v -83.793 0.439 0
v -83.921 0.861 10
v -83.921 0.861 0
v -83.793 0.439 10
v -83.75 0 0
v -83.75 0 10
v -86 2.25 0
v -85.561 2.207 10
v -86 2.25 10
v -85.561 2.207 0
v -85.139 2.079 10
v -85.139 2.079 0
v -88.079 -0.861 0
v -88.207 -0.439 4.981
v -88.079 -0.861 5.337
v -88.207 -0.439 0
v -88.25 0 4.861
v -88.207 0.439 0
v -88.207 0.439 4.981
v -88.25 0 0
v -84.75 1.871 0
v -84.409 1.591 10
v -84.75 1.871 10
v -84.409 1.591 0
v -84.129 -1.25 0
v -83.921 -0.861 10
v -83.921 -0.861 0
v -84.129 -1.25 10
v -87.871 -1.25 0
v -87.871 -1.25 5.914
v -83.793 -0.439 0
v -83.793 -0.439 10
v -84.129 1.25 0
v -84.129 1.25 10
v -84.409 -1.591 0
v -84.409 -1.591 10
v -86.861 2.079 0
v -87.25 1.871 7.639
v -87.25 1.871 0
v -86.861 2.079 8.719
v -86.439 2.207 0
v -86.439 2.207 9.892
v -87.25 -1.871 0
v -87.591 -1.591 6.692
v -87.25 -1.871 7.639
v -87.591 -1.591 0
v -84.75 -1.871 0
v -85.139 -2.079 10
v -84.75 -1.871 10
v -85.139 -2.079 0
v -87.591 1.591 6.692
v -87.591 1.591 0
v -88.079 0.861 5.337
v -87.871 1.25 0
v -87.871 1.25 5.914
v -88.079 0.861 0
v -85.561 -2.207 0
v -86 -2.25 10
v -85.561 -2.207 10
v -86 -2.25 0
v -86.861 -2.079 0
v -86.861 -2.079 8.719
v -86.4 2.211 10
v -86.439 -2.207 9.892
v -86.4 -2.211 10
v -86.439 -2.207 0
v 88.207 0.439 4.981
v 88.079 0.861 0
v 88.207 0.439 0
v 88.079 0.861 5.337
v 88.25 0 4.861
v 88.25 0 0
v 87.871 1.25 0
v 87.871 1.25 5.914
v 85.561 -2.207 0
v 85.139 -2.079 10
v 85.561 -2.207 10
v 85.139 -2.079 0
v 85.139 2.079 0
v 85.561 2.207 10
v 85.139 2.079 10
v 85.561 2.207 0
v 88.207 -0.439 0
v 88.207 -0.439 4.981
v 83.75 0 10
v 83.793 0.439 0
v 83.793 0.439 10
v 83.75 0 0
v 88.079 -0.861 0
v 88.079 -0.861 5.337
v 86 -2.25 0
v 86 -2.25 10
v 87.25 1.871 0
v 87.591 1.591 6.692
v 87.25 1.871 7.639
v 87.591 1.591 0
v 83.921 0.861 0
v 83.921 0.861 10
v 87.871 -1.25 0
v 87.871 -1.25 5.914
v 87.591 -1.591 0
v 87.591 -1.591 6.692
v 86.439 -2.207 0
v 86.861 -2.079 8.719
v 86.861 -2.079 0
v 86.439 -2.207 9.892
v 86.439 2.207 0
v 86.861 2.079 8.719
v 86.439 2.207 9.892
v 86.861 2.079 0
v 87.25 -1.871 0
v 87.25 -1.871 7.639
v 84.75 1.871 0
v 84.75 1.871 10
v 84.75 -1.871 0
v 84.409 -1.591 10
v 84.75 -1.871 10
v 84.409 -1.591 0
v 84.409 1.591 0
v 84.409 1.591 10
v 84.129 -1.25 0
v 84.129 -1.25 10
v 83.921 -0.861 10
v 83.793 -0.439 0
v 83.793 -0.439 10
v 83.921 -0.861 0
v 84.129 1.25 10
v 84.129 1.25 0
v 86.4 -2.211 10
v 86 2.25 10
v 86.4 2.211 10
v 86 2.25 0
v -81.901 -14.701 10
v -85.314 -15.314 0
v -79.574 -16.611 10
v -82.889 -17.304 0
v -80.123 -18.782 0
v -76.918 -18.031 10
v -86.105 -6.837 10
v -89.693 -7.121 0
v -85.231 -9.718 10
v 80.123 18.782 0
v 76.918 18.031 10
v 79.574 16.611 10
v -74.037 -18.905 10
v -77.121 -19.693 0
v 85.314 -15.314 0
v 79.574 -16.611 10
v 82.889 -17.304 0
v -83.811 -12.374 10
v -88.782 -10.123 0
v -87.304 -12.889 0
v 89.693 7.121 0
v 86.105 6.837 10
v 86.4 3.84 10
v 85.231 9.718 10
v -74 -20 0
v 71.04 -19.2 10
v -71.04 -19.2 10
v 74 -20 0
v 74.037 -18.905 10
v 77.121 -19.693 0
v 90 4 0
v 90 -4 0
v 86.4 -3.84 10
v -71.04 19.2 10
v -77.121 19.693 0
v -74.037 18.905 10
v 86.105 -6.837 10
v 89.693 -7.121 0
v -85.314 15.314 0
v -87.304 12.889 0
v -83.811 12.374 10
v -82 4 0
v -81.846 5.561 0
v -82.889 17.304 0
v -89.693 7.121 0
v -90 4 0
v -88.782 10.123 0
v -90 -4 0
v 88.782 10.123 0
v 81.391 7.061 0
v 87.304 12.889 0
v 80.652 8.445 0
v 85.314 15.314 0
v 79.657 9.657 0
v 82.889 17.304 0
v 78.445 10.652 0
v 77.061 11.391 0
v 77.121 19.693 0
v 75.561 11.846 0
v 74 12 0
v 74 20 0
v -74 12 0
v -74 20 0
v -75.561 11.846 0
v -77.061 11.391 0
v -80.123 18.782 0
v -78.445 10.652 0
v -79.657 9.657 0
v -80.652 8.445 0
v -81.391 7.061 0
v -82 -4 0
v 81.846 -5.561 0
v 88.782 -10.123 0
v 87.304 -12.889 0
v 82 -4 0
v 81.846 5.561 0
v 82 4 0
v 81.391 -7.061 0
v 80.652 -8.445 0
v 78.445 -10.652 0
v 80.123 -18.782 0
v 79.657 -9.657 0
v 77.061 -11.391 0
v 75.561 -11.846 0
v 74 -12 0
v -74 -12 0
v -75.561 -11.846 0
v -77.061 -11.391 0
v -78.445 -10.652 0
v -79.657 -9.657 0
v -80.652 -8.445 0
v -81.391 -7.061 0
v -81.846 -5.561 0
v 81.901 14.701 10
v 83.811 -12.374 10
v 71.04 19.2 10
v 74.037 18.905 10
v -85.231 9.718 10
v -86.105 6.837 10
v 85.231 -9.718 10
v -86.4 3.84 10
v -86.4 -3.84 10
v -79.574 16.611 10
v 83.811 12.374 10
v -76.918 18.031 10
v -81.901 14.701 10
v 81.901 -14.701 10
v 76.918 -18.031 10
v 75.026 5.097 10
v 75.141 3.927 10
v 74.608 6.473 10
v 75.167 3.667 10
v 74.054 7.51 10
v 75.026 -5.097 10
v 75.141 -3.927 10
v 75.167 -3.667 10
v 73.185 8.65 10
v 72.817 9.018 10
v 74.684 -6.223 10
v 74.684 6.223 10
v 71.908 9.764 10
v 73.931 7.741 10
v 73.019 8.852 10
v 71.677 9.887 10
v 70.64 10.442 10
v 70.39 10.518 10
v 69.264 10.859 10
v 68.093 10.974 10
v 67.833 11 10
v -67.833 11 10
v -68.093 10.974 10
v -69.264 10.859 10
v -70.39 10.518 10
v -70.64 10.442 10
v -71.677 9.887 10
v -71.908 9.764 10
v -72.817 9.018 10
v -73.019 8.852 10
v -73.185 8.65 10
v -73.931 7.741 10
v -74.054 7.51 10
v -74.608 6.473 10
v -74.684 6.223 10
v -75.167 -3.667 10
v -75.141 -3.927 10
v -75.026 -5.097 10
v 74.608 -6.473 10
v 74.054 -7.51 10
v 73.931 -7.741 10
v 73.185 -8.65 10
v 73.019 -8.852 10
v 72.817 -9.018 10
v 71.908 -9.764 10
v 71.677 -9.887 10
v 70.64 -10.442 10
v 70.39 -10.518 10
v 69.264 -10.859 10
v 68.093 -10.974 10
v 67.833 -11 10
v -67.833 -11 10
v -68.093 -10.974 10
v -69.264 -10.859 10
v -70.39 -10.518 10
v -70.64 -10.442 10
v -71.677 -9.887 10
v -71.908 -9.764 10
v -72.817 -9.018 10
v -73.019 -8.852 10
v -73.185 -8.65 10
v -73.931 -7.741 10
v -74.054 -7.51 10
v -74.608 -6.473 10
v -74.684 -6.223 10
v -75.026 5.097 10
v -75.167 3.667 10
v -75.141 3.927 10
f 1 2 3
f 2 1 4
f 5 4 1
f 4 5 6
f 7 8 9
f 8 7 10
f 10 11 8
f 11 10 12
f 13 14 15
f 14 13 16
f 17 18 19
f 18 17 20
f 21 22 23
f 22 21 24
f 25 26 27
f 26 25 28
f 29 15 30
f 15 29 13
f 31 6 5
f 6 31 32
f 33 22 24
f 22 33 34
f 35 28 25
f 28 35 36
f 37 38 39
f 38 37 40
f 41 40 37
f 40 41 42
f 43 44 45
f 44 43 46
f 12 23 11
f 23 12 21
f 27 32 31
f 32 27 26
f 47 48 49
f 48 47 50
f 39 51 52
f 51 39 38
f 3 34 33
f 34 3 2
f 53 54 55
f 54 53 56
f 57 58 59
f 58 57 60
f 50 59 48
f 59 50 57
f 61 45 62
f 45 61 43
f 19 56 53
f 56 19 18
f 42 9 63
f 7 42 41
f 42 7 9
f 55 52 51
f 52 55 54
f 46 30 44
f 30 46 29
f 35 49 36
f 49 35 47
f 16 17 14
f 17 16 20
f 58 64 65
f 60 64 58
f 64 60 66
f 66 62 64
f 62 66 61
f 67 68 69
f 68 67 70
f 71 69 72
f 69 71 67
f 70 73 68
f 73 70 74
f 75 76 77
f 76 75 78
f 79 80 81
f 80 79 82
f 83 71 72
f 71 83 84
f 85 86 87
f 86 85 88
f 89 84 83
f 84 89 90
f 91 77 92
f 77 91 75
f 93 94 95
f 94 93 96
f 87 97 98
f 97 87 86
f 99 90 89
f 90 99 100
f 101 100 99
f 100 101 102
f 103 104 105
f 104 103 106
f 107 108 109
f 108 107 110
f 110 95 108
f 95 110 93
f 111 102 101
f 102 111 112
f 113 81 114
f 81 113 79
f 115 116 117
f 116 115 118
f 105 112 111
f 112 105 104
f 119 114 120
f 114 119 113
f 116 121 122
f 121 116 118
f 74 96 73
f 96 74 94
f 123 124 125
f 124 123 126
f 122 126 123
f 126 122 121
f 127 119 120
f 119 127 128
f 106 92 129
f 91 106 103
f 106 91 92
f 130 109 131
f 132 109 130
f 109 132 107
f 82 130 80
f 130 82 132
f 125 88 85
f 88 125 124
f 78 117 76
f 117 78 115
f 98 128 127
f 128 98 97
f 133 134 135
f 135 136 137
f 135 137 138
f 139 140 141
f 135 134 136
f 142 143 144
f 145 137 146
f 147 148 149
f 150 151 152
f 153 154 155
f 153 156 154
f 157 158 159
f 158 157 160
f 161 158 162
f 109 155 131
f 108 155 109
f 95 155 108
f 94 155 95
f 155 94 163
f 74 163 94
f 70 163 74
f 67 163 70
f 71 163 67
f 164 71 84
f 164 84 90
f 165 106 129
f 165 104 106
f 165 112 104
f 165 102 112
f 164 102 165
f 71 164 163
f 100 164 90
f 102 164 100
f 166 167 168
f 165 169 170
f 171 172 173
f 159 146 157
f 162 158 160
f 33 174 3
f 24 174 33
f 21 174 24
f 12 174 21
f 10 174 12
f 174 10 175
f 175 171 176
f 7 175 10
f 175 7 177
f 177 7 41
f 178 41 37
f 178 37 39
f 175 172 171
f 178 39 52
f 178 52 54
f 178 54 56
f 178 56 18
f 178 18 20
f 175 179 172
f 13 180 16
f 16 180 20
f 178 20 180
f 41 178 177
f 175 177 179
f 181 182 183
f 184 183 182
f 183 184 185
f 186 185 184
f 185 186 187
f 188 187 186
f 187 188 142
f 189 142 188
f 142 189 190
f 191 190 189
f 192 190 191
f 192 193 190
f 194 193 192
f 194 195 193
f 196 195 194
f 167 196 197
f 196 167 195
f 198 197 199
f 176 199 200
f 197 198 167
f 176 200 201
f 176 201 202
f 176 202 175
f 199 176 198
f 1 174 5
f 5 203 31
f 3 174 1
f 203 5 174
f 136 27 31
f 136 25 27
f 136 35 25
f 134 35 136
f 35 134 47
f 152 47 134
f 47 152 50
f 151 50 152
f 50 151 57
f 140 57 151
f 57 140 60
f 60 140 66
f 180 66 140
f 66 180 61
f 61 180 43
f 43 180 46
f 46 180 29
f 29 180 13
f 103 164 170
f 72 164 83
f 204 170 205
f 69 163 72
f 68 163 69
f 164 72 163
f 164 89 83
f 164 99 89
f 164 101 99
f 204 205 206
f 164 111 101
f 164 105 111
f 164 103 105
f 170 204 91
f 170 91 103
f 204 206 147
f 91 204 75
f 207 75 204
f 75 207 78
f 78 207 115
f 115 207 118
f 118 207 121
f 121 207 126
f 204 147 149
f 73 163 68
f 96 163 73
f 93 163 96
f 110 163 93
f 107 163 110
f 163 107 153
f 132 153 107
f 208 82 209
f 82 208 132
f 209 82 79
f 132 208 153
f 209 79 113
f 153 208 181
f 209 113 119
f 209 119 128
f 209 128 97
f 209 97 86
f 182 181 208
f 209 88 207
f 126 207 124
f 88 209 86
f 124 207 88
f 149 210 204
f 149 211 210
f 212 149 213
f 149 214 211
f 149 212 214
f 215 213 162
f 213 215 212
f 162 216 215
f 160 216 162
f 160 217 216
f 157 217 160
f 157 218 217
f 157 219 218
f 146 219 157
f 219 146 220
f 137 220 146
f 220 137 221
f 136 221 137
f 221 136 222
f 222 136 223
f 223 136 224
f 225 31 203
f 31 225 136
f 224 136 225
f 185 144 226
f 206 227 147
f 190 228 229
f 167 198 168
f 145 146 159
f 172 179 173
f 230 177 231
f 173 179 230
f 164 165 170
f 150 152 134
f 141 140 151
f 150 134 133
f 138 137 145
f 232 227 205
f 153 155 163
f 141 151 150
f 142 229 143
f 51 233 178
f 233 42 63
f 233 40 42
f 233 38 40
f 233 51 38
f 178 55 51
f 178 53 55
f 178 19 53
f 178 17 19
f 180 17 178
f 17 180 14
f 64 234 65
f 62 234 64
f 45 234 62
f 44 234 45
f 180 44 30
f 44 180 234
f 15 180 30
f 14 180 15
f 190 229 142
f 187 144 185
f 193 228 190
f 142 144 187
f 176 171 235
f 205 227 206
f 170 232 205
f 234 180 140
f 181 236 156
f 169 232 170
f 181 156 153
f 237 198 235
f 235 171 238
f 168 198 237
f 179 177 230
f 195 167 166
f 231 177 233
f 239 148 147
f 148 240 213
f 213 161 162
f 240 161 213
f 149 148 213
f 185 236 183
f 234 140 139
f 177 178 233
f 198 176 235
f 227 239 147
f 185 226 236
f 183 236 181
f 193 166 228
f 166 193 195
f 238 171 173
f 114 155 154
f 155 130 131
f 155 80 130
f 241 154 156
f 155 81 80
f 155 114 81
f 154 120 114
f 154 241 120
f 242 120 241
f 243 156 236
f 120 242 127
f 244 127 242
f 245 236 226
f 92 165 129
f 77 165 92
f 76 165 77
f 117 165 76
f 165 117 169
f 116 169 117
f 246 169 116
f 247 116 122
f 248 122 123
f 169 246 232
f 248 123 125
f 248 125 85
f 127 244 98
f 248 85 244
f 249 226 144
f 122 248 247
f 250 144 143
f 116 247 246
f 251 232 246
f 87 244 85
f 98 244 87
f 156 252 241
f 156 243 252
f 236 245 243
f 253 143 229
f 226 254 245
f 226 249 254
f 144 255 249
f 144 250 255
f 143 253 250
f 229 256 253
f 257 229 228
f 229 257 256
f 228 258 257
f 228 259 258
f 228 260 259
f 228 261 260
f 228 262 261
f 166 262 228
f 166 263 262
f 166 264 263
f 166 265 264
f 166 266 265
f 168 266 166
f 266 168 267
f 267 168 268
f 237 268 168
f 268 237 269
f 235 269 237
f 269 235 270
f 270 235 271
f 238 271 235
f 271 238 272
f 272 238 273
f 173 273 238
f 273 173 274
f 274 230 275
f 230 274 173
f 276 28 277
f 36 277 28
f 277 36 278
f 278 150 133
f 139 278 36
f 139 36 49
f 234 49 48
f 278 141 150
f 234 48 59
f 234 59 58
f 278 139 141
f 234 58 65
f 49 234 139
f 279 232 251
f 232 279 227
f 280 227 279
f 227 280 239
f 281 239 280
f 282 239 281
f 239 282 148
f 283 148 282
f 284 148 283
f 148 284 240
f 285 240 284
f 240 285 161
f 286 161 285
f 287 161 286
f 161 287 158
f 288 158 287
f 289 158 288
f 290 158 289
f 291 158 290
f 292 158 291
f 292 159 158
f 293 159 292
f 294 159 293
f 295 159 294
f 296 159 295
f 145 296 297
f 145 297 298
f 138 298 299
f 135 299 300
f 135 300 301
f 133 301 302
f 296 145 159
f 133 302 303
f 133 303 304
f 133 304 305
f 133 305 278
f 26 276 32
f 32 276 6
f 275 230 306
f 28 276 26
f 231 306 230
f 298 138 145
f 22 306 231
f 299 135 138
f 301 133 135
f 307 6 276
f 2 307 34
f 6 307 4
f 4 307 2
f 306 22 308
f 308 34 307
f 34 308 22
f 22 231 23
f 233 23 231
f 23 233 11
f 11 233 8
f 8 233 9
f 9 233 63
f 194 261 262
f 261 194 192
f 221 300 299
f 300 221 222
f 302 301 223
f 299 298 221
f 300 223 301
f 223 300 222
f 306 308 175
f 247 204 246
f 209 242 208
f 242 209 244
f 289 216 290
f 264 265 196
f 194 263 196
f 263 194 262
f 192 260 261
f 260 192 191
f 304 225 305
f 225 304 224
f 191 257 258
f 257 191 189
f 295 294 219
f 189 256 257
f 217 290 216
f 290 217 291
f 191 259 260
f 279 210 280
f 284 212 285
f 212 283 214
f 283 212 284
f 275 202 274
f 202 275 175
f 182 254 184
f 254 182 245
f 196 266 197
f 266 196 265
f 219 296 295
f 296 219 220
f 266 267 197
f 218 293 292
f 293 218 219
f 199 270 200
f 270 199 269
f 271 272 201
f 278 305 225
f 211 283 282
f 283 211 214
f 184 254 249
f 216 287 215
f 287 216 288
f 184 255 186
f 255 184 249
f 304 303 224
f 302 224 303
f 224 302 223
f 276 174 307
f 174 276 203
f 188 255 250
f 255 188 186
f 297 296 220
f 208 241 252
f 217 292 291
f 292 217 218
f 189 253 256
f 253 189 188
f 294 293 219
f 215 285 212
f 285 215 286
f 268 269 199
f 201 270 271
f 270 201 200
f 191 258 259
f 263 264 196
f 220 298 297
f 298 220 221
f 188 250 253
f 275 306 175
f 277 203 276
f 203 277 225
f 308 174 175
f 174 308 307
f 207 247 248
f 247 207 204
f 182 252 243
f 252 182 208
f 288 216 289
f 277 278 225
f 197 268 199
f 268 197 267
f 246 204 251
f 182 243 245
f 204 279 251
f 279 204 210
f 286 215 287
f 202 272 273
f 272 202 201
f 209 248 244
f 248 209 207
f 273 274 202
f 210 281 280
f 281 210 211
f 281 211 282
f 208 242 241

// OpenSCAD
$fn = 32;

// ----------------------------------------------------------------------
// Display bezel: 180 x 40 mm frame, opening 164x24 mm
// ----------------------------------------------------------------------

// --- parameters (mm) ---
length = 180;             // frame outside length, X
width = 40;               // frame outside width, Y
frame_w = 8;              // frame width
thickness = 10;           // frame thickness
corner_r = 16;            // outside corner radius
chamfer = 0.96;           // outer wall taper
funnel = 0.9;             // inner opening taper
opening_l = 164;          // opening length
opening_w = 24;           // opening width
inner_r = 8;              // opening corner radius
hole_d = 4.5;             // mounting screw clearance
holes_per_side = 1;       // holes per short side
hole_inset = 4;           // hole centre inset from the outside edge

/* rounded-rectangle outlines, generated with loops */
module rounded_ring(l_nom, w_nom, r) {
  hull() {
    for (sx = [-1, 1]) for (sy = [-1, 1])
      translate([sx * (l_nom / 2 - r), sy * (w_nom / 2 - r)]) circle(r = r);
  }
}

difference() {
  /* frame body, drafted so the outer edge is a variable-depth chamfer */
  linear_extrude(height = thickness, scale = chamfer)
    rounded_ring(length, width, corner_r);
  /* viewing opening, drafted the other way for a funnel edge */
  linear_extrude(height = thickness + 2, scale = funnel)
    translate([0, 0, -1]) rounded_ring(opening_l, opening_w, inner_r);
  /* mounting screws through the frame lands */
  for (sx = [-1, 1]) for (i = [1 : holes_per_side])
    translate([sx * (length / 2 - hole_inset),
               (i - (holes_per_side + 1) / 2) * width * 0.5, -1])
      cylinder(h = thickness + 2, d = hole_d);
}
